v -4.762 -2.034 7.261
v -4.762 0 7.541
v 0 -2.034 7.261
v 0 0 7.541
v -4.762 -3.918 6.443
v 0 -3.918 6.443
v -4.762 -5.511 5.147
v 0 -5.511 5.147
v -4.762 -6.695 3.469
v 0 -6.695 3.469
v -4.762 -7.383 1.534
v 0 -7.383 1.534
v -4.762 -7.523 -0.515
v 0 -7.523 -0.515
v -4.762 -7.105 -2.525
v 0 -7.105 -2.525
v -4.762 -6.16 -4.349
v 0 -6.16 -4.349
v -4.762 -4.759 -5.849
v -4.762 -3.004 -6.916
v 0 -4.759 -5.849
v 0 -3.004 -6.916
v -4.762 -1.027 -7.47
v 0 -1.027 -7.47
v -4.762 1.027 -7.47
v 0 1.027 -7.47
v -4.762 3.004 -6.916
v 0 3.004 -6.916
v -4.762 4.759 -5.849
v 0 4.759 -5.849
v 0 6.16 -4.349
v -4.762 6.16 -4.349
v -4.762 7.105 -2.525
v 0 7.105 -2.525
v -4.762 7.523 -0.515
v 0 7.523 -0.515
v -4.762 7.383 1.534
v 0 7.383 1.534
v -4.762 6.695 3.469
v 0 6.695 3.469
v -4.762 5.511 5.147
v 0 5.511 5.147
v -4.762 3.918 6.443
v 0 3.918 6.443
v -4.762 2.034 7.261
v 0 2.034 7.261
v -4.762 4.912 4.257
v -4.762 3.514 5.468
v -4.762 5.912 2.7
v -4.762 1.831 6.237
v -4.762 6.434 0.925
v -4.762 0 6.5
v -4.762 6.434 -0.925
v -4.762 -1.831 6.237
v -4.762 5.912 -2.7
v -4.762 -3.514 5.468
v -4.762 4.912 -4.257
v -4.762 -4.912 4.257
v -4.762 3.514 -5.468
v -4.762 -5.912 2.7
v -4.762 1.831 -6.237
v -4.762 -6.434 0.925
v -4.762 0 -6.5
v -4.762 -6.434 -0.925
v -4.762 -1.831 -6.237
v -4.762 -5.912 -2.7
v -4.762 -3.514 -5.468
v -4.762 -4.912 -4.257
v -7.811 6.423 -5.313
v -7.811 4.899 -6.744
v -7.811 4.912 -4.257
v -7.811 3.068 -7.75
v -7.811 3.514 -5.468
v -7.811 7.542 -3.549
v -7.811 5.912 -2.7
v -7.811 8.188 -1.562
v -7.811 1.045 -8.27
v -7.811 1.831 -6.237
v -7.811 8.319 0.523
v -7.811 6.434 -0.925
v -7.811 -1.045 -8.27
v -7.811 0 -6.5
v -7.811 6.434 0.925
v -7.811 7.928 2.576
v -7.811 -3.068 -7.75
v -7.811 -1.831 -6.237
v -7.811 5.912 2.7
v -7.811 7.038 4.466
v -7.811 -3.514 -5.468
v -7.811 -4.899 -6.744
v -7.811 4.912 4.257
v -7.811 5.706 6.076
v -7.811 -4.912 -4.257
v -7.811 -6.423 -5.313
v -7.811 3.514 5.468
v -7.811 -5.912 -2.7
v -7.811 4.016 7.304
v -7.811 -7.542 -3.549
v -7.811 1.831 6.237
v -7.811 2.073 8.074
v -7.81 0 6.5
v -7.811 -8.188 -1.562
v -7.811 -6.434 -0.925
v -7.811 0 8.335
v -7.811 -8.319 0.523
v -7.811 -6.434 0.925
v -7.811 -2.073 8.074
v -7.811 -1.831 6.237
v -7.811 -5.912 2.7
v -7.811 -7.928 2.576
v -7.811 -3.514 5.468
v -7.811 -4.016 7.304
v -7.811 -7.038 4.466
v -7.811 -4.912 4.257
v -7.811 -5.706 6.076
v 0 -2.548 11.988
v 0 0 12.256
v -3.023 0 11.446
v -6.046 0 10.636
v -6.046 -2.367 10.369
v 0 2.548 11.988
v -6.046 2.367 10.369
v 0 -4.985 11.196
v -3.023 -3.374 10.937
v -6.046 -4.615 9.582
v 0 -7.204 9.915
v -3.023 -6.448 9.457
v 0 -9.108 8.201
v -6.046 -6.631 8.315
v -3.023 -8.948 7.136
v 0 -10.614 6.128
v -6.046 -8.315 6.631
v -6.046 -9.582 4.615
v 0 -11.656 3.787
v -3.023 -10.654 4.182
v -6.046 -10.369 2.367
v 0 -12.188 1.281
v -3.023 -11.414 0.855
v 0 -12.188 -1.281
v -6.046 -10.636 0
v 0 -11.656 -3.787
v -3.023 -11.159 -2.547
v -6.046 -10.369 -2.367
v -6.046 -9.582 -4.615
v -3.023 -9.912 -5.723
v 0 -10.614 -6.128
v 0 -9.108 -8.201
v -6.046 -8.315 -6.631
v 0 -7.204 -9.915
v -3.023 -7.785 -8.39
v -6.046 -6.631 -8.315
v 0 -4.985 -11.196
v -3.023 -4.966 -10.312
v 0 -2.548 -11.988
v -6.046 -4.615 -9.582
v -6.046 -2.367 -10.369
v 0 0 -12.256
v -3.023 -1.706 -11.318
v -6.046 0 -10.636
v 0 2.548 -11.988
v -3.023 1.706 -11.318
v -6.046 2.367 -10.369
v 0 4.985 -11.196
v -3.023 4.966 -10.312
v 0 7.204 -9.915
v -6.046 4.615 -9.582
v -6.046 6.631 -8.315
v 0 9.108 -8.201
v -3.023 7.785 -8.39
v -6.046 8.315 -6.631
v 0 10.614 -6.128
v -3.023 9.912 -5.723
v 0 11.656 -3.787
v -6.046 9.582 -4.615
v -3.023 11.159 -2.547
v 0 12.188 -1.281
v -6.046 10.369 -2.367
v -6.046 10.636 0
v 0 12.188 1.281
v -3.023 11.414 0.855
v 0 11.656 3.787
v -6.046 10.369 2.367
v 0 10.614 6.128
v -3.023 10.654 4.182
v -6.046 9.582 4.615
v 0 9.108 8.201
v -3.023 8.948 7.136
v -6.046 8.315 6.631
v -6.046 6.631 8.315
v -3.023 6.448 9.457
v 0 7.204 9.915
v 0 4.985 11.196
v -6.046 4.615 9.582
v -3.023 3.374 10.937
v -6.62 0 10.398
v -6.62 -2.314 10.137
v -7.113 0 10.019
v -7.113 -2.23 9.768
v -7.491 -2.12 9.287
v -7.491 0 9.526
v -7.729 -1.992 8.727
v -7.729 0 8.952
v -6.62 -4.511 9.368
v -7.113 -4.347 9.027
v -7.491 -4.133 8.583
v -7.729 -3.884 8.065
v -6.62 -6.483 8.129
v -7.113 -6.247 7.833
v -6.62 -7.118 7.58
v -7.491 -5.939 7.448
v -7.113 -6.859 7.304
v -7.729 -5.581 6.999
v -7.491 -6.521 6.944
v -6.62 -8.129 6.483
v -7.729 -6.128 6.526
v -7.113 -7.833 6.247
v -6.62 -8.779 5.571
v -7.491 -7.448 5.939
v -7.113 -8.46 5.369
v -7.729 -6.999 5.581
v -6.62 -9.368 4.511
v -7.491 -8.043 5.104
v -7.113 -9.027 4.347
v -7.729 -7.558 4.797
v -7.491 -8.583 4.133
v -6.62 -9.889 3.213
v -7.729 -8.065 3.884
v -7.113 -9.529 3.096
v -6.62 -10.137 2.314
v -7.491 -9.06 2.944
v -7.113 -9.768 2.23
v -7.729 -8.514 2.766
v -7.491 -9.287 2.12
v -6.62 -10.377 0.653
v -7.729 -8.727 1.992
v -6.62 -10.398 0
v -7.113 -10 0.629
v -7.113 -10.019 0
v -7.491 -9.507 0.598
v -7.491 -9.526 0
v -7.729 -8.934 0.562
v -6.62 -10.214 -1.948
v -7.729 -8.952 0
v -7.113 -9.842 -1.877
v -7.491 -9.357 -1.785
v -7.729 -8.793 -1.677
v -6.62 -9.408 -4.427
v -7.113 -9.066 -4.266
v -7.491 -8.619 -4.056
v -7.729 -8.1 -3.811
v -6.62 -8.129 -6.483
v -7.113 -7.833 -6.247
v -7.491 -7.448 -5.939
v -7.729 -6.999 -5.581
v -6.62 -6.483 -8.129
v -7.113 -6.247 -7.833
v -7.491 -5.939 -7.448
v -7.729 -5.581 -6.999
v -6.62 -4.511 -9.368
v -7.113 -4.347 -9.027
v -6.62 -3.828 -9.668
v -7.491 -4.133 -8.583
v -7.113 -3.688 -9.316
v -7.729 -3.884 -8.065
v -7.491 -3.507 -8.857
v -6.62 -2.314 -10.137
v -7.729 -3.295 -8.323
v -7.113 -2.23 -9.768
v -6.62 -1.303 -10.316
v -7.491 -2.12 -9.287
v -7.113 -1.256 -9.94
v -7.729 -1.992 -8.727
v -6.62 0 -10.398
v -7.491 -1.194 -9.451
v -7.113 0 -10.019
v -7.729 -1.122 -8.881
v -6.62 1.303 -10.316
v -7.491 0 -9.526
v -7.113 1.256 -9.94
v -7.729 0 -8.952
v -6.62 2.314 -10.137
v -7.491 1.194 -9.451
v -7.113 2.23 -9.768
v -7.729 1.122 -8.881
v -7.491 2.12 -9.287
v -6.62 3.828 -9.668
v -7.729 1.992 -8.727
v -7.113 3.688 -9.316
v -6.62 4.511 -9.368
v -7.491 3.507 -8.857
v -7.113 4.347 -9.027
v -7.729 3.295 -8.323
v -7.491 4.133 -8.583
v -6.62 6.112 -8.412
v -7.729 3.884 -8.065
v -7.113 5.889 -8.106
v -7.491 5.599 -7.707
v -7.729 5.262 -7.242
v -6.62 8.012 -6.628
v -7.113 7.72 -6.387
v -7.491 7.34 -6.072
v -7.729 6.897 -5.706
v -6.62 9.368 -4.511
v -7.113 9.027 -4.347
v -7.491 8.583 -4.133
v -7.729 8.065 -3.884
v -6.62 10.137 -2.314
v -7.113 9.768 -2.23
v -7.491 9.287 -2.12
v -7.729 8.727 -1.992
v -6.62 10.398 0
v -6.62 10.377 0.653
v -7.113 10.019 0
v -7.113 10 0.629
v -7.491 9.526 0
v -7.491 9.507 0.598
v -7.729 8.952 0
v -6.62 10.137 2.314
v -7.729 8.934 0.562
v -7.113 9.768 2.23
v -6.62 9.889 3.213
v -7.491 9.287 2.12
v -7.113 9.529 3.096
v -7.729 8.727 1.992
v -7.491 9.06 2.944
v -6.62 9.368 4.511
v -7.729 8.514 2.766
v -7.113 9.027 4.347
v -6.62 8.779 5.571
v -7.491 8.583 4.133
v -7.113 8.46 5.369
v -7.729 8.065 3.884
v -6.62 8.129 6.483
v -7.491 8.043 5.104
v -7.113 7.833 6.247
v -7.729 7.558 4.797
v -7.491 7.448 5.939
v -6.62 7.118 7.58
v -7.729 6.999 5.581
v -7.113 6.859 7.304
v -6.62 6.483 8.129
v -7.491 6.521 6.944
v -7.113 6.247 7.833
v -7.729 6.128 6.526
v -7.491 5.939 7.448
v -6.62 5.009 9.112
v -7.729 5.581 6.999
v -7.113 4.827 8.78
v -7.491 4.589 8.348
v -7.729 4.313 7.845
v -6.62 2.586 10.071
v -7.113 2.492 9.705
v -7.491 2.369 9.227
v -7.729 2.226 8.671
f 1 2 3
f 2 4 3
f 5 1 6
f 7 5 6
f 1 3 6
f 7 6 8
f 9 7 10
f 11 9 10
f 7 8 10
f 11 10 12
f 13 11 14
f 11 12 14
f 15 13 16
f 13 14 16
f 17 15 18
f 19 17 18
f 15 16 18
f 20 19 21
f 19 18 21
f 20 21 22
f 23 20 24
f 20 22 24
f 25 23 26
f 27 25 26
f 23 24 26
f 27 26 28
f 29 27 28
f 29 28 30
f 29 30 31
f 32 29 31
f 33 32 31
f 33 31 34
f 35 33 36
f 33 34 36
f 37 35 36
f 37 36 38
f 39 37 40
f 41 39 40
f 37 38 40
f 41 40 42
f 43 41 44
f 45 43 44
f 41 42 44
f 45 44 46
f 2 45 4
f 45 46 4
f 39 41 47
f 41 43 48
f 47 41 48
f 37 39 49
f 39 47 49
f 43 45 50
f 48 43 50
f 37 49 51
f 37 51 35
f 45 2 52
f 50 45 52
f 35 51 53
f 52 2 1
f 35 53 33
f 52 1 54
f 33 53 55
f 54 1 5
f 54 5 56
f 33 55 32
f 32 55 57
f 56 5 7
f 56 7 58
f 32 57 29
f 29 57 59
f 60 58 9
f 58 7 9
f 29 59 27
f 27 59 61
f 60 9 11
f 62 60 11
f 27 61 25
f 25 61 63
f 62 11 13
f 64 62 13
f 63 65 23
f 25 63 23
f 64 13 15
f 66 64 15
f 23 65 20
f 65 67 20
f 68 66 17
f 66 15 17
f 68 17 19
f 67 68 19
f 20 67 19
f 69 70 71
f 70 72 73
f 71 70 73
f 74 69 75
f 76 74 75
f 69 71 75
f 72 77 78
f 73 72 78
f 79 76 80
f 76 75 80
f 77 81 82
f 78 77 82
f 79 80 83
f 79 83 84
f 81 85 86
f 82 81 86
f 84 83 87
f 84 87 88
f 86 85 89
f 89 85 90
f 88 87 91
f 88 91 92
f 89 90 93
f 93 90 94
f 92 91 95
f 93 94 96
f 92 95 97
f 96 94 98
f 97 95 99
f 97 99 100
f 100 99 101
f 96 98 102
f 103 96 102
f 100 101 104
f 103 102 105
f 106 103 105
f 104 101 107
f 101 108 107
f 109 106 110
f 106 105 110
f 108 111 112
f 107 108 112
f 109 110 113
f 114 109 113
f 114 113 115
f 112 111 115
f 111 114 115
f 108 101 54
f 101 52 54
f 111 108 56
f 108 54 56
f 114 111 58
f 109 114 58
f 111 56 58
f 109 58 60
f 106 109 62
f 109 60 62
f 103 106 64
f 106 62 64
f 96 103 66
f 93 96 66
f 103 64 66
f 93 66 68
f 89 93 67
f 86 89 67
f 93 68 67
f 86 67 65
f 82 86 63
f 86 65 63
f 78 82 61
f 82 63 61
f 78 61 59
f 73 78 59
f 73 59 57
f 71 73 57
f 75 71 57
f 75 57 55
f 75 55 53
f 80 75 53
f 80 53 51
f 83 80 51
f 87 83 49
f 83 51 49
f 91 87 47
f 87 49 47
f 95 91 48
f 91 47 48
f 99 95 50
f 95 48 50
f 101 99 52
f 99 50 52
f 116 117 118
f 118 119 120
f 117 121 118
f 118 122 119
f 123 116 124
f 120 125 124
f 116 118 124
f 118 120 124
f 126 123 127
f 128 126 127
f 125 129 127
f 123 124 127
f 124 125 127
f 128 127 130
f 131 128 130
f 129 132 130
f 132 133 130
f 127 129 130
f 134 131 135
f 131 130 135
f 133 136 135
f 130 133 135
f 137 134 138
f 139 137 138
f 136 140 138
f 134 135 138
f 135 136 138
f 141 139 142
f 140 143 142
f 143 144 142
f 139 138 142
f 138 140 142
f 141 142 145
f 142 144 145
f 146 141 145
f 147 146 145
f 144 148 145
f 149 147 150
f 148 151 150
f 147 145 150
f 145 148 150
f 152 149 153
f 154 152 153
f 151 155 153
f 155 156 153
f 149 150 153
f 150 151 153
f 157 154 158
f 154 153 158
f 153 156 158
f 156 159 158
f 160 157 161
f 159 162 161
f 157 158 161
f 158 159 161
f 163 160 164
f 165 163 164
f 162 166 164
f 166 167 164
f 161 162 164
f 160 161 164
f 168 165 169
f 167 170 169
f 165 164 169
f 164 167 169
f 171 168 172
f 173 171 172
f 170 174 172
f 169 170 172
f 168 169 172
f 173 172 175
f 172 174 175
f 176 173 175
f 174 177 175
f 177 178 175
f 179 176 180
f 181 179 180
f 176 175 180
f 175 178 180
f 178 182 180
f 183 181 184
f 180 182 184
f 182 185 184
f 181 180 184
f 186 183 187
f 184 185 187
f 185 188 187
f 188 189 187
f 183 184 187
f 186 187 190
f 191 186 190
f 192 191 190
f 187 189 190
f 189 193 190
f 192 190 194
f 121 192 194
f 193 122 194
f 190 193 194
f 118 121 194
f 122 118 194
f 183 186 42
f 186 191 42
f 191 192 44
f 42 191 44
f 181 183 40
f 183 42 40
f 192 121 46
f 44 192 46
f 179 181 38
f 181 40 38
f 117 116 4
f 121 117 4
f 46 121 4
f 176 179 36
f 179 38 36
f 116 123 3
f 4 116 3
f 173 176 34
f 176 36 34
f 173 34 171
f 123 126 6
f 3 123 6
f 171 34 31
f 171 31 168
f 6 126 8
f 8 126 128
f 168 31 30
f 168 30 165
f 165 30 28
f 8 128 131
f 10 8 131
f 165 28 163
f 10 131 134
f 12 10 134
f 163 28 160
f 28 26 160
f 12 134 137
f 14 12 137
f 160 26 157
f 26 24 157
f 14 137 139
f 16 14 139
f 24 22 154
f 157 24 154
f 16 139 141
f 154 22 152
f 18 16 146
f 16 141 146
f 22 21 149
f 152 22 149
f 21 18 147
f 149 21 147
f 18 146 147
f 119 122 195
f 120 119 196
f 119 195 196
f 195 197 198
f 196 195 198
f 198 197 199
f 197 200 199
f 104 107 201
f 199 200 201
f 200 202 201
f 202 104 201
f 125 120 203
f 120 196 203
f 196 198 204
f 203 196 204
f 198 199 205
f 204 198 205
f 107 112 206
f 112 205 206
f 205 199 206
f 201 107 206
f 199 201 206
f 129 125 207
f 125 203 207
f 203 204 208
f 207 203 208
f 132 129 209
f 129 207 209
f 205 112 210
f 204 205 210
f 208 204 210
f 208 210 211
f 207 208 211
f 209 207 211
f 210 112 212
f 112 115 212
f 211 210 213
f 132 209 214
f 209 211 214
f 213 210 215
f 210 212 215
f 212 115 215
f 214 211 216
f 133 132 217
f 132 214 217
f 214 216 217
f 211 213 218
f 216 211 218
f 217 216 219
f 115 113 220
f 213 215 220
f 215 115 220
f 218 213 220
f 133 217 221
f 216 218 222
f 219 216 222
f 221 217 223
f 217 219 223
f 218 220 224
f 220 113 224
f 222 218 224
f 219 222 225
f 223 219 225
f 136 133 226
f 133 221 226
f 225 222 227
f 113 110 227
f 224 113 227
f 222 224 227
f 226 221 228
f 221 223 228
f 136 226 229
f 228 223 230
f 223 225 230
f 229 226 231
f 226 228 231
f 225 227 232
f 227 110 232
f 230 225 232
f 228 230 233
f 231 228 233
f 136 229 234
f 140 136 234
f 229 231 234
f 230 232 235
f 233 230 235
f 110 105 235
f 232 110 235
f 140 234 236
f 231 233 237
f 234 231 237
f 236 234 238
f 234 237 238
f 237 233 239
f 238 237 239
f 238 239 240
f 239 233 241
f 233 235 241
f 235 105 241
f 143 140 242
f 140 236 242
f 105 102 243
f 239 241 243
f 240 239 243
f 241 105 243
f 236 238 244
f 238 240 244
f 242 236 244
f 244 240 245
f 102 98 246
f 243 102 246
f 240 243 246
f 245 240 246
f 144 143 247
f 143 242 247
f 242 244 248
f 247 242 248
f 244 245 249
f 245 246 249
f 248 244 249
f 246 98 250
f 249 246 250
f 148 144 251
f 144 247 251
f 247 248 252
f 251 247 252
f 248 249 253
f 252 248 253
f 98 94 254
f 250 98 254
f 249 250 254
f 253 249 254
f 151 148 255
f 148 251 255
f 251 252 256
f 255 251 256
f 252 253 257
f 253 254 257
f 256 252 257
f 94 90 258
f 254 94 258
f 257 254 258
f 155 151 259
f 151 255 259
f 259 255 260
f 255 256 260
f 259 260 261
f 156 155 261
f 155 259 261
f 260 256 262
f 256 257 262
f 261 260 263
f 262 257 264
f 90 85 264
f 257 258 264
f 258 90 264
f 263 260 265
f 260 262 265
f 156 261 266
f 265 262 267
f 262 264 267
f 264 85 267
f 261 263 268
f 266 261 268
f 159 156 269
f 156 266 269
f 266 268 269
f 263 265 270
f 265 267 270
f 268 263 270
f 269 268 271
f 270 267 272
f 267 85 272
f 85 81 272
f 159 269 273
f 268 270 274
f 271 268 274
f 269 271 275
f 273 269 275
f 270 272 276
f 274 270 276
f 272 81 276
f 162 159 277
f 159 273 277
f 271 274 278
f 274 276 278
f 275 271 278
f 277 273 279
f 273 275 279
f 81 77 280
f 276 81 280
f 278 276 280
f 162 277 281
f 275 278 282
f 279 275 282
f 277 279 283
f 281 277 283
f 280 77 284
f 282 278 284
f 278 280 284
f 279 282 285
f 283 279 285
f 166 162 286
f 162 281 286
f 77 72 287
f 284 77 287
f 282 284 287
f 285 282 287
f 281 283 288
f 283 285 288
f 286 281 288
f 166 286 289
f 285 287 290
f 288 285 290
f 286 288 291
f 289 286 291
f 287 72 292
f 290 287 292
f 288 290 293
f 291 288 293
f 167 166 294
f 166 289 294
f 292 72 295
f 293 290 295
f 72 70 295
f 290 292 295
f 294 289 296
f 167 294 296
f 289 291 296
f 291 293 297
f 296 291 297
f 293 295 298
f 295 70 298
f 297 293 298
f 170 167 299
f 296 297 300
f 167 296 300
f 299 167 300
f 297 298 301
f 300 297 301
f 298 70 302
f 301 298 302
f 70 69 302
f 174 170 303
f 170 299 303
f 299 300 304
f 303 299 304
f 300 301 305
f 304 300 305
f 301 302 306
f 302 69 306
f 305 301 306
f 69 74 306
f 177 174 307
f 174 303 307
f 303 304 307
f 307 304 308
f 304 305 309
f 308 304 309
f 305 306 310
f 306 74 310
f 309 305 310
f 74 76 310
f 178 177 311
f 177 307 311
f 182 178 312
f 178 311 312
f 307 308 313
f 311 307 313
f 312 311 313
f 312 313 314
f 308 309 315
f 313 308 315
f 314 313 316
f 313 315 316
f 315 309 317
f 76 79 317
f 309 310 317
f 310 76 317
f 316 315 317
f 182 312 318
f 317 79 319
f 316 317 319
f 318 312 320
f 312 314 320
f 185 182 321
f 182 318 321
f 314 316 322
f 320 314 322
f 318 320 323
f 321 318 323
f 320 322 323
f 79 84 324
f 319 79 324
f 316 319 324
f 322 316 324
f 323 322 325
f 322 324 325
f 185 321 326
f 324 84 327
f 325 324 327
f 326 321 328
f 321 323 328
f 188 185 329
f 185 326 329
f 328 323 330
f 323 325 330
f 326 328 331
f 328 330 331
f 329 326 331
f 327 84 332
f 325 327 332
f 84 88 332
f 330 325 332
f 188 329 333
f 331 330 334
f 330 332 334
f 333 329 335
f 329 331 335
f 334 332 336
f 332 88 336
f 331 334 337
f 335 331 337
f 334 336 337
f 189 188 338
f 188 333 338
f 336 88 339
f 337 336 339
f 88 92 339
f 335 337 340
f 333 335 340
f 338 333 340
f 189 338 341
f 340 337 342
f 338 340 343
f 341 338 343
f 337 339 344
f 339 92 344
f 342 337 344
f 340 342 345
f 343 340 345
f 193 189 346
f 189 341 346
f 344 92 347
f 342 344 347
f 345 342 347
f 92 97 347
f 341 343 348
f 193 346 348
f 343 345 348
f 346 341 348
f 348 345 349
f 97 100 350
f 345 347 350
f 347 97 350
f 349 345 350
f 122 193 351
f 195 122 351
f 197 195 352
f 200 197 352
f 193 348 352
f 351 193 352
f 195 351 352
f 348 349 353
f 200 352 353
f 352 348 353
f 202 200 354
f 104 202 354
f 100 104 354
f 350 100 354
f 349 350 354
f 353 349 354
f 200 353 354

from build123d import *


# Not quite as in the source:
# - a feature names something its author has since deleted; it is built from what else it names


with BuildPart() as f1:
    # F0 (on Front) → F1 (revolve)
    with BuildSketch(Plane.XZ):
        with BuildLine():
            Line((0, 7.540625), (0, 12.2555))
            Line((0, 12.2555), (-6.0455628512, 10.6355963162))
            ThreePointArc((-6.0455628512, 10.6355963162), (-7.3184226416, 9.7850985952), (-7.8105, 8.3354854424))
            Line((-7.8105, 8.3354854424), (-7.8105, 6.49986))
            Line((-7.8105, 6.49986), (-4.7625, 6.49986))
            Line((-4.7625, 6.49986), (-4.7625, 7.540625))
            Line((-4.7625, 7.540625), (0, 7.540625))
        make_face()
    revolve(axis=Axis((5.2561350167, 0, 0), (1, 0, 0)))


solid = f1.part
